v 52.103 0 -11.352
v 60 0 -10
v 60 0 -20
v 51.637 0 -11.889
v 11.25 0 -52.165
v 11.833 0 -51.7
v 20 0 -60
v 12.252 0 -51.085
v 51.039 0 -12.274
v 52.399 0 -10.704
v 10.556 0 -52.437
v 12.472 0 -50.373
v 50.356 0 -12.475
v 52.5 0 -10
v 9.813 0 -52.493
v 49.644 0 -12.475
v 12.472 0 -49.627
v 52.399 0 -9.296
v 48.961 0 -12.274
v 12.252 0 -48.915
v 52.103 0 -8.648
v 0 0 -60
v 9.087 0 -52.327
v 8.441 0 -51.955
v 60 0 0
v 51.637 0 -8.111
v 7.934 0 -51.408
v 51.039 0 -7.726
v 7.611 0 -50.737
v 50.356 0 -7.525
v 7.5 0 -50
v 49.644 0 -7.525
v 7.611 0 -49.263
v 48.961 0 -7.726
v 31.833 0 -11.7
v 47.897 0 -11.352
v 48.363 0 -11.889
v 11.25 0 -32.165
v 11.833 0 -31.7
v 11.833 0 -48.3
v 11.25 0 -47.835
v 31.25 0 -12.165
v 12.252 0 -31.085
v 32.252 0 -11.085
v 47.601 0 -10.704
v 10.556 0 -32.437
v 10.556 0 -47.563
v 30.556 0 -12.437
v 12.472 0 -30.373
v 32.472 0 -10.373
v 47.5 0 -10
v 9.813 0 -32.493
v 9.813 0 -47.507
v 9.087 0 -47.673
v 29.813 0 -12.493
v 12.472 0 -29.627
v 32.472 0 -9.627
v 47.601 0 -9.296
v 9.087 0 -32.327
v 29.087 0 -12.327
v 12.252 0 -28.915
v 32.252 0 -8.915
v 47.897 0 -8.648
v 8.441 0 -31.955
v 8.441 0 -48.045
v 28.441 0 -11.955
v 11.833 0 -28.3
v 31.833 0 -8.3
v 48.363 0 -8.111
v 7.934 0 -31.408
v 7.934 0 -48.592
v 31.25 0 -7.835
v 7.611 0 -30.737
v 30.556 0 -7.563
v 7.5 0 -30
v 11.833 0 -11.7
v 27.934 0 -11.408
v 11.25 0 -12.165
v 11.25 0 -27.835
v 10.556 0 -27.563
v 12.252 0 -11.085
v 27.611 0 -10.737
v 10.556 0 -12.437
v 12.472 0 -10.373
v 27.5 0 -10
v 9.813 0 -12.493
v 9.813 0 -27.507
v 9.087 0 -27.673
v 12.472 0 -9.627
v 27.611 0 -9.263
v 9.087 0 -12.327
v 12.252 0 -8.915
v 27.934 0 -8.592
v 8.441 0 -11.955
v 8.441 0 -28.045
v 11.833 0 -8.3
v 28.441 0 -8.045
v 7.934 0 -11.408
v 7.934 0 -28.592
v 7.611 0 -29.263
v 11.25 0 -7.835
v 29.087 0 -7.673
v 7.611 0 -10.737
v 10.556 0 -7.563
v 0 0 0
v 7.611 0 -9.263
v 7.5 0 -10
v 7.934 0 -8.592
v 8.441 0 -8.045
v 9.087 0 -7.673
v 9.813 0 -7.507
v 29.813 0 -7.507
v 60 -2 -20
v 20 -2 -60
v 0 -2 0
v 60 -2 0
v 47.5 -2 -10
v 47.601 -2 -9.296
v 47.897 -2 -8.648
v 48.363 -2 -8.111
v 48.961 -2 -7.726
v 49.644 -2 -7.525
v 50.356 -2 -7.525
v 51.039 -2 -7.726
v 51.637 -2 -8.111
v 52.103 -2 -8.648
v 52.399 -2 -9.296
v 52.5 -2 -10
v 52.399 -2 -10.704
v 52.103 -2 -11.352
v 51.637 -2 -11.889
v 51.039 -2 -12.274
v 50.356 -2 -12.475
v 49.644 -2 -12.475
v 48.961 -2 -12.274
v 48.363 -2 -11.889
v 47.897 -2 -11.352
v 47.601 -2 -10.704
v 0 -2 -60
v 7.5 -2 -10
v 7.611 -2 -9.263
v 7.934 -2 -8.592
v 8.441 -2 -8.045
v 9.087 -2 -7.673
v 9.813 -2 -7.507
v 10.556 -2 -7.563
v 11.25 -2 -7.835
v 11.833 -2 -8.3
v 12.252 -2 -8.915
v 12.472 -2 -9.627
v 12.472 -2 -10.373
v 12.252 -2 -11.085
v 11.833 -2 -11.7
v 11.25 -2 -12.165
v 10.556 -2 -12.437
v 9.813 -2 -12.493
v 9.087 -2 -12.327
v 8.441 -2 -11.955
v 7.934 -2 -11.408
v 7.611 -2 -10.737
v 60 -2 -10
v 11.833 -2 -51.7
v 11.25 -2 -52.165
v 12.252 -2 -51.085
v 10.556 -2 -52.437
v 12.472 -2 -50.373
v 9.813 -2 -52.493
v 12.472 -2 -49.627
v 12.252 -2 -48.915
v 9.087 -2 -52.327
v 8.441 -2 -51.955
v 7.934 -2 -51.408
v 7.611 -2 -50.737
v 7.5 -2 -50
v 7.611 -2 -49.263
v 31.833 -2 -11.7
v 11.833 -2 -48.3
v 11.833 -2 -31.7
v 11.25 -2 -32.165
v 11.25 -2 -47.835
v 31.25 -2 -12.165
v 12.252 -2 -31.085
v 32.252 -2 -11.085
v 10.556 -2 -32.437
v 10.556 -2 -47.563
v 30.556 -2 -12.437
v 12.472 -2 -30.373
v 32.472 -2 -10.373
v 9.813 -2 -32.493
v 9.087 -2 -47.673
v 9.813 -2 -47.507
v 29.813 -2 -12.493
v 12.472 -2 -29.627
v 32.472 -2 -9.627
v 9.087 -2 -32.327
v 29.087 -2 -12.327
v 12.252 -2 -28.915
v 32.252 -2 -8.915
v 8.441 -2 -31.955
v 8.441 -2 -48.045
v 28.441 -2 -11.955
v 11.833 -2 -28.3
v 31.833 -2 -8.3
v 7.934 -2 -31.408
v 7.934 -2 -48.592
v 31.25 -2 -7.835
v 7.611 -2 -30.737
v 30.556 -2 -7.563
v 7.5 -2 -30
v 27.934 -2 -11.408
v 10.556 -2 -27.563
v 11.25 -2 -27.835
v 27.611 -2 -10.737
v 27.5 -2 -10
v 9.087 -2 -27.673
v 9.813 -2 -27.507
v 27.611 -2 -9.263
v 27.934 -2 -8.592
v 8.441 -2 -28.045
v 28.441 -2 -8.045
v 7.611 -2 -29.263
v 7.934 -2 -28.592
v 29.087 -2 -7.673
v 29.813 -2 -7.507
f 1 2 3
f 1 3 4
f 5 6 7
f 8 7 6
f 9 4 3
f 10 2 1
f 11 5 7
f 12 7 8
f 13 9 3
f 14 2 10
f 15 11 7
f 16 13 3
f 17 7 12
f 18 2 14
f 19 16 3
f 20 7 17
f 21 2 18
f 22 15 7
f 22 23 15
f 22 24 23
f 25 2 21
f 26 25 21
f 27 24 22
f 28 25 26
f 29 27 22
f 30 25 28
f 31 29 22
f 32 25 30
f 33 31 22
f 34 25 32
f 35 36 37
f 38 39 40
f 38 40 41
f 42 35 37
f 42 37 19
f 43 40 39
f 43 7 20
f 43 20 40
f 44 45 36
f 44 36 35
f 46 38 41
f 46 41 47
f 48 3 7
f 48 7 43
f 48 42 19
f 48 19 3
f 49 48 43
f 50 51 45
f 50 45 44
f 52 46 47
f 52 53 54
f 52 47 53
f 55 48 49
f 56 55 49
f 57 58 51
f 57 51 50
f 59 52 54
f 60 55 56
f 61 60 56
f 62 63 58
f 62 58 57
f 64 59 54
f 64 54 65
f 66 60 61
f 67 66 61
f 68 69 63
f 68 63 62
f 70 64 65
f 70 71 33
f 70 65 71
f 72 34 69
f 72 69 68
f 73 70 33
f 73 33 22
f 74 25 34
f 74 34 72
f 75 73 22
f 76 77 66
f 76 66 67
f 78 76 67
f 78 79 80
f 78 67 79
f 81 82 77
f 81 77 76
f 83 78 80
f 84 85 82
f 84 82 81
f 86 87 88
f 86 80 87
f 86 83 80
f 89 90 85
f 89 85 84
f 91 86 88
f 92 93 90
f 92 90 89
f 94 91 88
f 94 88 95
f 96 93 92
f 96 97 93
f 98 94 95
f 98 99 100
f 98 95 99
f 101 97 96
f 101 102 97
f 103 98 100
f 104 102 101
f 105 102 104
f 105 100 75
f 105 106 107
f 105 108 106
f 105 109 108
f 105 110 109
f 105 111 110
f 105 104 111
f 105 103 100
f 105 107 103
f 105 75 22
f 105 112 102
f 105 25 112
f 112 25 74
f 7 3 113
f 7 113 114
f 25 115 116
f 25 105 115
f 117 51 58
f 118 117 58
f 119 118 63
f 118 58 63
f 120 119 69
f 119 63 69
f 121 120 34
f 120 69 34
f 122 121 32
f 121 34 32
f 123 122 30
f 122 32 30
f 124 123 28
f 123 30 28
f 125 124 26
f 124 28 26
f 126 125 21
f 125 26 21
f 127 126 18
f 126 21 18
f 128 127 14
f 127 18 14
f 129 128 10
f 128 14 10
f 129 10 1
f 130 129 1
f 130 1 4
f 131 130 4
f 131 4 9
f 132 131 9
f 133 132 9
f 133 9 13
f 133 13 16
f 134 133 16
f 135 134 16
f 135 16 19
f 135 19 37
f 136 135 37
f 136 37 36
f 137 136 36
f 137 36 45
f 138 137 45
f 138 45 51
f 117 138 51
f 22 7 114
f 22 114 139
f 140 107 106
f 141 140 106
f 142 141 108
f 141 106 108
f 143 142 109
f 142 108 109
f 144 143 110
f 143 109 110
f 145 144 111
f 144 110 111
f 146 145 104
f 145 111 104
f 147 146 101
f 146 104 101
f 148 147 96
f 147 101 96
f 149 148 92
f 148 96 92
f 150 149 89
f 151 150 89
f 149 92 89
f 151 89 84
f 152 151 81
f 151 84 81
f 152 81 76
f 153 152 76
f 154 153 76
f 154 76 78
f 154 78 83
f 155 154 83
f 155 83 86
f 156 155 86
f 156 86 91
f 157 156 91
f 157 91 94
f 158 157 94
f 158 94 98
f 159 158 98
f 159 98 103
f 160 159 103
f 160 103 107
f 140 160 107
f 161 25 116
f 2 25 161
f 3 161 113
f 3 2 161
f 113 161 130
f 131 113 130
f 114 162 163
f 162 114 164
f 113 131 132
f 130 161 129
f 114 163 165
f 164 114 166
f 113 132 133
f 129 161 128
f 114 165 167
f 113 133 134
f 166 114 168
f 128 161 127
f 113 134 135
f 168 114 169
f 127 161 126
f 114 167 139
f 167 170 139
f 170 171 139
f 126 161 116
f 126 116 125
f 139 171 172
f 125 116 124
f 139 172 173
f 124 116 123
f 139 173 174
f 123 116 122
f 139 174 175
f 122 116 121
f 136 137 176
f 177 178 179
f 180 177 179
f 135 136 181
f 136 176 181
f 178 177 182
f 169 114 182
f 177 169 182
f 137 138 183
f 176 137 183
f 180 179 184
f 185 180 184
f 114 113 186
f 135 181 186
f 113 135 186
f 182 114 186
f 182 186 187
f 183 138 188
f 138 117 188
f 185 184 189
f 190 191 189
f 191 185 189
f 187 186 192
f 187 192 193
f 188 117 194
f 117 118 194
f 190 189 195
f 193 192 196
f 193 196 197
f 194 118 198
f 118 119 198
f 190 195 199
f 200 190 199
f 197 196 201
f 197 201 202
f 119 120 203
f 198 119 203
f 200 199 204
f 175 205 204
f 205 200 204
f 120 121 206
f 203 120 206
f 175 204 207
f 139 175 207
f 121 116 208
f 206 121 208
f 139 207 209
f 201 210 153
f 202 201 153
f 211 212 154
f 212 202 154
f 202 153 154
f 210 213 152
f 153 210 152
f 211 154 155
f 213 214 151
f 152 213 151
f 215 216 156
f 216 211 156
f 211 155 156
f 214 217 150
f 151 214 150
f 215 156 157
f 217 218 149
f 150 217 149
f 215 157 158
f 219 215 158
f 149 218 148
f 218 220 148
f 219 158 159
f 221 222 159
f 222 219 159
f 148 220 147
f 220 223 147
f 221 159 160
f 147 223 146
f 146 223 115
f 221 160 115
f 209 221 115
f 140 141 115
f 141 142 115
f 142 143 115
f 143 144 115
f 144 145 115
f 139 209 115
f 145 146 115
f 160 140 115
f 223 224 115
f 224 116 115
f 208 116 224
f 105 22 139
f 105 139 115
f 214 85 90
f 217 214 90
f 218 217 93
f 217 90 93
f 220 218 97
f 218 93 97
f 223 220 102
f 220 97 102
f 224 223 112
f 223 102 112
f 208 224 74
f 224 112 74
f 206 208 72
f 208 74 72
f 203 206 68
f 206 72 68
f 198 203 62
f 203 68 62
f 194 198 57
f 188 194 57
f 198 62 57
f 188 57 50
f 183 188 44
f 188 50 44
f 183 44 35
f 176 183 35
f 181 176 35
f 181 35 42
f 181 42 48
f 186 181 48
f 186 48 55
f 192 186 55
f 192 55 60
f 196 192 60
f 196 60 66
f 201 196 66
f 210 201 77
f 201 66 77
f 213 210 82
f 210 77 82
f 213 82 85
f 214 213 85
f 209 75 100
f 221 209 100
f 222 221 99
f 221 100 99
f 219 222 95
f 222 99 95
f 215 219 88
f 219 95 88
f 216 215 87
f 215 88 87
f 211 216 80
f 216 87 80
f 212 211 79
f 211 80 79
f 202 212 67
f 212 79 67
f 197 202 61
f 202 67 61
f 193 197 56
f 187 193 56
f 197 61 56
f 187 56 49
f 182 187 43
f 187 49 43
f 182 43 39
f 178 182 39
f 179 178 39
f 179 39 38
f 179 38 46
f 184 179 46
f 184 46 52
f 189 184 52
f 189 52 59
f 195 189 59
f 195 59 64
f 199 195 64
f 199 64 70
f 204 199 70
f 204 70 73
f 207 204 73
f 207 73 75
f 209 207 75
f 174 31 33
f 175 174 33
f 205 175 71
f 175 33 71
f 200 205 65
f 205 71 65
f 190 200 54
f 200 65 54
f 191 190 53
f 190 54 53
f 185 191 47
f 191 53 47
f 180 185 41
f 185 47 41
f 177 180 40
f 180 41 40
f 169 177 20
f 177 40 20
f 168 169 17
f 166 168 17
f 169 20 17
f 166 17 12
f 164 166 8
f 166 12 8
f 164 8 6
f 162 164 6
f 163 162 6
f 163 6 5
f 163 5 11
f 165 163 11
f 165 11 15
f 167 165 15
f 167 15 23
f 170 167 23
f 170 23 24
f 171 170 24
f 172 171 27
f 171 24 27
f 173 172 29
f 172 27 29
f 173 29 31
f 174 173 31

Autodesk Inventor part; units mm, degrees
ref_plane "YZ Plane" through (0, 0, 0) normal (1, 0, 0) x (0, 1, 0)
ref_plane "XZ Plane" through (0, 0, 0) normal (0, 1, 0) x (-1, 0, 0)
ref_plane "XY Plane" through (0, 0, 0) normal (0, 0, 1) x (1, 0, 0)
sketch "Sketch2" plane through (0, 0, 0) normal (0, 1, 0) x (-1, 0, 0)
  line L0 (0, 0) -> (-60, 0)
  line L1 (-60, 0) -> (-60, -20)
  line L2 (-60, -20) -> (0, -20)
  line L3 (0, -20) -> (0, 0)
  line L4 (0, -20) -> (-20, -20)
  line L5 (-20, -20) -> (-20, -60)
  line L6 (-20, -60) -> (0, -60)
  line L7 (0, -60) -> (0, -20)
  line L8 (-20, -20) -> (-35, -20)
  line L9 (-20, -20) -> (-20, -35)
  line L10 (-60, -20) -> (-20, -60)
  line L11 (-60, 0) -> (-60, -10)
  line L12 (-60, -10) -> (-50, -10)
  circle A0 centre (-50, -10) radius 2.5
  circle A1 centre (-30, -10) radius 2.5
  circle A2 centre (-10, -10) radius 2.5
  circle A3 centre (-10, -30) radius 2.5
  line L13 (0, -80) -> (0, -40)
  circle A4 centre (-10, -50) radius 2.5
  line L14 (0, -100) -> (0, -60)
  dimension "d4" = 60
  dimension "d5" = 20
  dimension "d6" = 20
  dimension "d7" = 40
  dimension "d10" = 10
  dimension "d11" = 10
  dimension "d12" = 5
  dimension "d15" = 20
  dimension "d22" = 20
extrude "Extrusion1" add sketch "Sketch2" against normal blind 2
properties part number "Connect2x2020_m5" material "Aluminum 6061"
